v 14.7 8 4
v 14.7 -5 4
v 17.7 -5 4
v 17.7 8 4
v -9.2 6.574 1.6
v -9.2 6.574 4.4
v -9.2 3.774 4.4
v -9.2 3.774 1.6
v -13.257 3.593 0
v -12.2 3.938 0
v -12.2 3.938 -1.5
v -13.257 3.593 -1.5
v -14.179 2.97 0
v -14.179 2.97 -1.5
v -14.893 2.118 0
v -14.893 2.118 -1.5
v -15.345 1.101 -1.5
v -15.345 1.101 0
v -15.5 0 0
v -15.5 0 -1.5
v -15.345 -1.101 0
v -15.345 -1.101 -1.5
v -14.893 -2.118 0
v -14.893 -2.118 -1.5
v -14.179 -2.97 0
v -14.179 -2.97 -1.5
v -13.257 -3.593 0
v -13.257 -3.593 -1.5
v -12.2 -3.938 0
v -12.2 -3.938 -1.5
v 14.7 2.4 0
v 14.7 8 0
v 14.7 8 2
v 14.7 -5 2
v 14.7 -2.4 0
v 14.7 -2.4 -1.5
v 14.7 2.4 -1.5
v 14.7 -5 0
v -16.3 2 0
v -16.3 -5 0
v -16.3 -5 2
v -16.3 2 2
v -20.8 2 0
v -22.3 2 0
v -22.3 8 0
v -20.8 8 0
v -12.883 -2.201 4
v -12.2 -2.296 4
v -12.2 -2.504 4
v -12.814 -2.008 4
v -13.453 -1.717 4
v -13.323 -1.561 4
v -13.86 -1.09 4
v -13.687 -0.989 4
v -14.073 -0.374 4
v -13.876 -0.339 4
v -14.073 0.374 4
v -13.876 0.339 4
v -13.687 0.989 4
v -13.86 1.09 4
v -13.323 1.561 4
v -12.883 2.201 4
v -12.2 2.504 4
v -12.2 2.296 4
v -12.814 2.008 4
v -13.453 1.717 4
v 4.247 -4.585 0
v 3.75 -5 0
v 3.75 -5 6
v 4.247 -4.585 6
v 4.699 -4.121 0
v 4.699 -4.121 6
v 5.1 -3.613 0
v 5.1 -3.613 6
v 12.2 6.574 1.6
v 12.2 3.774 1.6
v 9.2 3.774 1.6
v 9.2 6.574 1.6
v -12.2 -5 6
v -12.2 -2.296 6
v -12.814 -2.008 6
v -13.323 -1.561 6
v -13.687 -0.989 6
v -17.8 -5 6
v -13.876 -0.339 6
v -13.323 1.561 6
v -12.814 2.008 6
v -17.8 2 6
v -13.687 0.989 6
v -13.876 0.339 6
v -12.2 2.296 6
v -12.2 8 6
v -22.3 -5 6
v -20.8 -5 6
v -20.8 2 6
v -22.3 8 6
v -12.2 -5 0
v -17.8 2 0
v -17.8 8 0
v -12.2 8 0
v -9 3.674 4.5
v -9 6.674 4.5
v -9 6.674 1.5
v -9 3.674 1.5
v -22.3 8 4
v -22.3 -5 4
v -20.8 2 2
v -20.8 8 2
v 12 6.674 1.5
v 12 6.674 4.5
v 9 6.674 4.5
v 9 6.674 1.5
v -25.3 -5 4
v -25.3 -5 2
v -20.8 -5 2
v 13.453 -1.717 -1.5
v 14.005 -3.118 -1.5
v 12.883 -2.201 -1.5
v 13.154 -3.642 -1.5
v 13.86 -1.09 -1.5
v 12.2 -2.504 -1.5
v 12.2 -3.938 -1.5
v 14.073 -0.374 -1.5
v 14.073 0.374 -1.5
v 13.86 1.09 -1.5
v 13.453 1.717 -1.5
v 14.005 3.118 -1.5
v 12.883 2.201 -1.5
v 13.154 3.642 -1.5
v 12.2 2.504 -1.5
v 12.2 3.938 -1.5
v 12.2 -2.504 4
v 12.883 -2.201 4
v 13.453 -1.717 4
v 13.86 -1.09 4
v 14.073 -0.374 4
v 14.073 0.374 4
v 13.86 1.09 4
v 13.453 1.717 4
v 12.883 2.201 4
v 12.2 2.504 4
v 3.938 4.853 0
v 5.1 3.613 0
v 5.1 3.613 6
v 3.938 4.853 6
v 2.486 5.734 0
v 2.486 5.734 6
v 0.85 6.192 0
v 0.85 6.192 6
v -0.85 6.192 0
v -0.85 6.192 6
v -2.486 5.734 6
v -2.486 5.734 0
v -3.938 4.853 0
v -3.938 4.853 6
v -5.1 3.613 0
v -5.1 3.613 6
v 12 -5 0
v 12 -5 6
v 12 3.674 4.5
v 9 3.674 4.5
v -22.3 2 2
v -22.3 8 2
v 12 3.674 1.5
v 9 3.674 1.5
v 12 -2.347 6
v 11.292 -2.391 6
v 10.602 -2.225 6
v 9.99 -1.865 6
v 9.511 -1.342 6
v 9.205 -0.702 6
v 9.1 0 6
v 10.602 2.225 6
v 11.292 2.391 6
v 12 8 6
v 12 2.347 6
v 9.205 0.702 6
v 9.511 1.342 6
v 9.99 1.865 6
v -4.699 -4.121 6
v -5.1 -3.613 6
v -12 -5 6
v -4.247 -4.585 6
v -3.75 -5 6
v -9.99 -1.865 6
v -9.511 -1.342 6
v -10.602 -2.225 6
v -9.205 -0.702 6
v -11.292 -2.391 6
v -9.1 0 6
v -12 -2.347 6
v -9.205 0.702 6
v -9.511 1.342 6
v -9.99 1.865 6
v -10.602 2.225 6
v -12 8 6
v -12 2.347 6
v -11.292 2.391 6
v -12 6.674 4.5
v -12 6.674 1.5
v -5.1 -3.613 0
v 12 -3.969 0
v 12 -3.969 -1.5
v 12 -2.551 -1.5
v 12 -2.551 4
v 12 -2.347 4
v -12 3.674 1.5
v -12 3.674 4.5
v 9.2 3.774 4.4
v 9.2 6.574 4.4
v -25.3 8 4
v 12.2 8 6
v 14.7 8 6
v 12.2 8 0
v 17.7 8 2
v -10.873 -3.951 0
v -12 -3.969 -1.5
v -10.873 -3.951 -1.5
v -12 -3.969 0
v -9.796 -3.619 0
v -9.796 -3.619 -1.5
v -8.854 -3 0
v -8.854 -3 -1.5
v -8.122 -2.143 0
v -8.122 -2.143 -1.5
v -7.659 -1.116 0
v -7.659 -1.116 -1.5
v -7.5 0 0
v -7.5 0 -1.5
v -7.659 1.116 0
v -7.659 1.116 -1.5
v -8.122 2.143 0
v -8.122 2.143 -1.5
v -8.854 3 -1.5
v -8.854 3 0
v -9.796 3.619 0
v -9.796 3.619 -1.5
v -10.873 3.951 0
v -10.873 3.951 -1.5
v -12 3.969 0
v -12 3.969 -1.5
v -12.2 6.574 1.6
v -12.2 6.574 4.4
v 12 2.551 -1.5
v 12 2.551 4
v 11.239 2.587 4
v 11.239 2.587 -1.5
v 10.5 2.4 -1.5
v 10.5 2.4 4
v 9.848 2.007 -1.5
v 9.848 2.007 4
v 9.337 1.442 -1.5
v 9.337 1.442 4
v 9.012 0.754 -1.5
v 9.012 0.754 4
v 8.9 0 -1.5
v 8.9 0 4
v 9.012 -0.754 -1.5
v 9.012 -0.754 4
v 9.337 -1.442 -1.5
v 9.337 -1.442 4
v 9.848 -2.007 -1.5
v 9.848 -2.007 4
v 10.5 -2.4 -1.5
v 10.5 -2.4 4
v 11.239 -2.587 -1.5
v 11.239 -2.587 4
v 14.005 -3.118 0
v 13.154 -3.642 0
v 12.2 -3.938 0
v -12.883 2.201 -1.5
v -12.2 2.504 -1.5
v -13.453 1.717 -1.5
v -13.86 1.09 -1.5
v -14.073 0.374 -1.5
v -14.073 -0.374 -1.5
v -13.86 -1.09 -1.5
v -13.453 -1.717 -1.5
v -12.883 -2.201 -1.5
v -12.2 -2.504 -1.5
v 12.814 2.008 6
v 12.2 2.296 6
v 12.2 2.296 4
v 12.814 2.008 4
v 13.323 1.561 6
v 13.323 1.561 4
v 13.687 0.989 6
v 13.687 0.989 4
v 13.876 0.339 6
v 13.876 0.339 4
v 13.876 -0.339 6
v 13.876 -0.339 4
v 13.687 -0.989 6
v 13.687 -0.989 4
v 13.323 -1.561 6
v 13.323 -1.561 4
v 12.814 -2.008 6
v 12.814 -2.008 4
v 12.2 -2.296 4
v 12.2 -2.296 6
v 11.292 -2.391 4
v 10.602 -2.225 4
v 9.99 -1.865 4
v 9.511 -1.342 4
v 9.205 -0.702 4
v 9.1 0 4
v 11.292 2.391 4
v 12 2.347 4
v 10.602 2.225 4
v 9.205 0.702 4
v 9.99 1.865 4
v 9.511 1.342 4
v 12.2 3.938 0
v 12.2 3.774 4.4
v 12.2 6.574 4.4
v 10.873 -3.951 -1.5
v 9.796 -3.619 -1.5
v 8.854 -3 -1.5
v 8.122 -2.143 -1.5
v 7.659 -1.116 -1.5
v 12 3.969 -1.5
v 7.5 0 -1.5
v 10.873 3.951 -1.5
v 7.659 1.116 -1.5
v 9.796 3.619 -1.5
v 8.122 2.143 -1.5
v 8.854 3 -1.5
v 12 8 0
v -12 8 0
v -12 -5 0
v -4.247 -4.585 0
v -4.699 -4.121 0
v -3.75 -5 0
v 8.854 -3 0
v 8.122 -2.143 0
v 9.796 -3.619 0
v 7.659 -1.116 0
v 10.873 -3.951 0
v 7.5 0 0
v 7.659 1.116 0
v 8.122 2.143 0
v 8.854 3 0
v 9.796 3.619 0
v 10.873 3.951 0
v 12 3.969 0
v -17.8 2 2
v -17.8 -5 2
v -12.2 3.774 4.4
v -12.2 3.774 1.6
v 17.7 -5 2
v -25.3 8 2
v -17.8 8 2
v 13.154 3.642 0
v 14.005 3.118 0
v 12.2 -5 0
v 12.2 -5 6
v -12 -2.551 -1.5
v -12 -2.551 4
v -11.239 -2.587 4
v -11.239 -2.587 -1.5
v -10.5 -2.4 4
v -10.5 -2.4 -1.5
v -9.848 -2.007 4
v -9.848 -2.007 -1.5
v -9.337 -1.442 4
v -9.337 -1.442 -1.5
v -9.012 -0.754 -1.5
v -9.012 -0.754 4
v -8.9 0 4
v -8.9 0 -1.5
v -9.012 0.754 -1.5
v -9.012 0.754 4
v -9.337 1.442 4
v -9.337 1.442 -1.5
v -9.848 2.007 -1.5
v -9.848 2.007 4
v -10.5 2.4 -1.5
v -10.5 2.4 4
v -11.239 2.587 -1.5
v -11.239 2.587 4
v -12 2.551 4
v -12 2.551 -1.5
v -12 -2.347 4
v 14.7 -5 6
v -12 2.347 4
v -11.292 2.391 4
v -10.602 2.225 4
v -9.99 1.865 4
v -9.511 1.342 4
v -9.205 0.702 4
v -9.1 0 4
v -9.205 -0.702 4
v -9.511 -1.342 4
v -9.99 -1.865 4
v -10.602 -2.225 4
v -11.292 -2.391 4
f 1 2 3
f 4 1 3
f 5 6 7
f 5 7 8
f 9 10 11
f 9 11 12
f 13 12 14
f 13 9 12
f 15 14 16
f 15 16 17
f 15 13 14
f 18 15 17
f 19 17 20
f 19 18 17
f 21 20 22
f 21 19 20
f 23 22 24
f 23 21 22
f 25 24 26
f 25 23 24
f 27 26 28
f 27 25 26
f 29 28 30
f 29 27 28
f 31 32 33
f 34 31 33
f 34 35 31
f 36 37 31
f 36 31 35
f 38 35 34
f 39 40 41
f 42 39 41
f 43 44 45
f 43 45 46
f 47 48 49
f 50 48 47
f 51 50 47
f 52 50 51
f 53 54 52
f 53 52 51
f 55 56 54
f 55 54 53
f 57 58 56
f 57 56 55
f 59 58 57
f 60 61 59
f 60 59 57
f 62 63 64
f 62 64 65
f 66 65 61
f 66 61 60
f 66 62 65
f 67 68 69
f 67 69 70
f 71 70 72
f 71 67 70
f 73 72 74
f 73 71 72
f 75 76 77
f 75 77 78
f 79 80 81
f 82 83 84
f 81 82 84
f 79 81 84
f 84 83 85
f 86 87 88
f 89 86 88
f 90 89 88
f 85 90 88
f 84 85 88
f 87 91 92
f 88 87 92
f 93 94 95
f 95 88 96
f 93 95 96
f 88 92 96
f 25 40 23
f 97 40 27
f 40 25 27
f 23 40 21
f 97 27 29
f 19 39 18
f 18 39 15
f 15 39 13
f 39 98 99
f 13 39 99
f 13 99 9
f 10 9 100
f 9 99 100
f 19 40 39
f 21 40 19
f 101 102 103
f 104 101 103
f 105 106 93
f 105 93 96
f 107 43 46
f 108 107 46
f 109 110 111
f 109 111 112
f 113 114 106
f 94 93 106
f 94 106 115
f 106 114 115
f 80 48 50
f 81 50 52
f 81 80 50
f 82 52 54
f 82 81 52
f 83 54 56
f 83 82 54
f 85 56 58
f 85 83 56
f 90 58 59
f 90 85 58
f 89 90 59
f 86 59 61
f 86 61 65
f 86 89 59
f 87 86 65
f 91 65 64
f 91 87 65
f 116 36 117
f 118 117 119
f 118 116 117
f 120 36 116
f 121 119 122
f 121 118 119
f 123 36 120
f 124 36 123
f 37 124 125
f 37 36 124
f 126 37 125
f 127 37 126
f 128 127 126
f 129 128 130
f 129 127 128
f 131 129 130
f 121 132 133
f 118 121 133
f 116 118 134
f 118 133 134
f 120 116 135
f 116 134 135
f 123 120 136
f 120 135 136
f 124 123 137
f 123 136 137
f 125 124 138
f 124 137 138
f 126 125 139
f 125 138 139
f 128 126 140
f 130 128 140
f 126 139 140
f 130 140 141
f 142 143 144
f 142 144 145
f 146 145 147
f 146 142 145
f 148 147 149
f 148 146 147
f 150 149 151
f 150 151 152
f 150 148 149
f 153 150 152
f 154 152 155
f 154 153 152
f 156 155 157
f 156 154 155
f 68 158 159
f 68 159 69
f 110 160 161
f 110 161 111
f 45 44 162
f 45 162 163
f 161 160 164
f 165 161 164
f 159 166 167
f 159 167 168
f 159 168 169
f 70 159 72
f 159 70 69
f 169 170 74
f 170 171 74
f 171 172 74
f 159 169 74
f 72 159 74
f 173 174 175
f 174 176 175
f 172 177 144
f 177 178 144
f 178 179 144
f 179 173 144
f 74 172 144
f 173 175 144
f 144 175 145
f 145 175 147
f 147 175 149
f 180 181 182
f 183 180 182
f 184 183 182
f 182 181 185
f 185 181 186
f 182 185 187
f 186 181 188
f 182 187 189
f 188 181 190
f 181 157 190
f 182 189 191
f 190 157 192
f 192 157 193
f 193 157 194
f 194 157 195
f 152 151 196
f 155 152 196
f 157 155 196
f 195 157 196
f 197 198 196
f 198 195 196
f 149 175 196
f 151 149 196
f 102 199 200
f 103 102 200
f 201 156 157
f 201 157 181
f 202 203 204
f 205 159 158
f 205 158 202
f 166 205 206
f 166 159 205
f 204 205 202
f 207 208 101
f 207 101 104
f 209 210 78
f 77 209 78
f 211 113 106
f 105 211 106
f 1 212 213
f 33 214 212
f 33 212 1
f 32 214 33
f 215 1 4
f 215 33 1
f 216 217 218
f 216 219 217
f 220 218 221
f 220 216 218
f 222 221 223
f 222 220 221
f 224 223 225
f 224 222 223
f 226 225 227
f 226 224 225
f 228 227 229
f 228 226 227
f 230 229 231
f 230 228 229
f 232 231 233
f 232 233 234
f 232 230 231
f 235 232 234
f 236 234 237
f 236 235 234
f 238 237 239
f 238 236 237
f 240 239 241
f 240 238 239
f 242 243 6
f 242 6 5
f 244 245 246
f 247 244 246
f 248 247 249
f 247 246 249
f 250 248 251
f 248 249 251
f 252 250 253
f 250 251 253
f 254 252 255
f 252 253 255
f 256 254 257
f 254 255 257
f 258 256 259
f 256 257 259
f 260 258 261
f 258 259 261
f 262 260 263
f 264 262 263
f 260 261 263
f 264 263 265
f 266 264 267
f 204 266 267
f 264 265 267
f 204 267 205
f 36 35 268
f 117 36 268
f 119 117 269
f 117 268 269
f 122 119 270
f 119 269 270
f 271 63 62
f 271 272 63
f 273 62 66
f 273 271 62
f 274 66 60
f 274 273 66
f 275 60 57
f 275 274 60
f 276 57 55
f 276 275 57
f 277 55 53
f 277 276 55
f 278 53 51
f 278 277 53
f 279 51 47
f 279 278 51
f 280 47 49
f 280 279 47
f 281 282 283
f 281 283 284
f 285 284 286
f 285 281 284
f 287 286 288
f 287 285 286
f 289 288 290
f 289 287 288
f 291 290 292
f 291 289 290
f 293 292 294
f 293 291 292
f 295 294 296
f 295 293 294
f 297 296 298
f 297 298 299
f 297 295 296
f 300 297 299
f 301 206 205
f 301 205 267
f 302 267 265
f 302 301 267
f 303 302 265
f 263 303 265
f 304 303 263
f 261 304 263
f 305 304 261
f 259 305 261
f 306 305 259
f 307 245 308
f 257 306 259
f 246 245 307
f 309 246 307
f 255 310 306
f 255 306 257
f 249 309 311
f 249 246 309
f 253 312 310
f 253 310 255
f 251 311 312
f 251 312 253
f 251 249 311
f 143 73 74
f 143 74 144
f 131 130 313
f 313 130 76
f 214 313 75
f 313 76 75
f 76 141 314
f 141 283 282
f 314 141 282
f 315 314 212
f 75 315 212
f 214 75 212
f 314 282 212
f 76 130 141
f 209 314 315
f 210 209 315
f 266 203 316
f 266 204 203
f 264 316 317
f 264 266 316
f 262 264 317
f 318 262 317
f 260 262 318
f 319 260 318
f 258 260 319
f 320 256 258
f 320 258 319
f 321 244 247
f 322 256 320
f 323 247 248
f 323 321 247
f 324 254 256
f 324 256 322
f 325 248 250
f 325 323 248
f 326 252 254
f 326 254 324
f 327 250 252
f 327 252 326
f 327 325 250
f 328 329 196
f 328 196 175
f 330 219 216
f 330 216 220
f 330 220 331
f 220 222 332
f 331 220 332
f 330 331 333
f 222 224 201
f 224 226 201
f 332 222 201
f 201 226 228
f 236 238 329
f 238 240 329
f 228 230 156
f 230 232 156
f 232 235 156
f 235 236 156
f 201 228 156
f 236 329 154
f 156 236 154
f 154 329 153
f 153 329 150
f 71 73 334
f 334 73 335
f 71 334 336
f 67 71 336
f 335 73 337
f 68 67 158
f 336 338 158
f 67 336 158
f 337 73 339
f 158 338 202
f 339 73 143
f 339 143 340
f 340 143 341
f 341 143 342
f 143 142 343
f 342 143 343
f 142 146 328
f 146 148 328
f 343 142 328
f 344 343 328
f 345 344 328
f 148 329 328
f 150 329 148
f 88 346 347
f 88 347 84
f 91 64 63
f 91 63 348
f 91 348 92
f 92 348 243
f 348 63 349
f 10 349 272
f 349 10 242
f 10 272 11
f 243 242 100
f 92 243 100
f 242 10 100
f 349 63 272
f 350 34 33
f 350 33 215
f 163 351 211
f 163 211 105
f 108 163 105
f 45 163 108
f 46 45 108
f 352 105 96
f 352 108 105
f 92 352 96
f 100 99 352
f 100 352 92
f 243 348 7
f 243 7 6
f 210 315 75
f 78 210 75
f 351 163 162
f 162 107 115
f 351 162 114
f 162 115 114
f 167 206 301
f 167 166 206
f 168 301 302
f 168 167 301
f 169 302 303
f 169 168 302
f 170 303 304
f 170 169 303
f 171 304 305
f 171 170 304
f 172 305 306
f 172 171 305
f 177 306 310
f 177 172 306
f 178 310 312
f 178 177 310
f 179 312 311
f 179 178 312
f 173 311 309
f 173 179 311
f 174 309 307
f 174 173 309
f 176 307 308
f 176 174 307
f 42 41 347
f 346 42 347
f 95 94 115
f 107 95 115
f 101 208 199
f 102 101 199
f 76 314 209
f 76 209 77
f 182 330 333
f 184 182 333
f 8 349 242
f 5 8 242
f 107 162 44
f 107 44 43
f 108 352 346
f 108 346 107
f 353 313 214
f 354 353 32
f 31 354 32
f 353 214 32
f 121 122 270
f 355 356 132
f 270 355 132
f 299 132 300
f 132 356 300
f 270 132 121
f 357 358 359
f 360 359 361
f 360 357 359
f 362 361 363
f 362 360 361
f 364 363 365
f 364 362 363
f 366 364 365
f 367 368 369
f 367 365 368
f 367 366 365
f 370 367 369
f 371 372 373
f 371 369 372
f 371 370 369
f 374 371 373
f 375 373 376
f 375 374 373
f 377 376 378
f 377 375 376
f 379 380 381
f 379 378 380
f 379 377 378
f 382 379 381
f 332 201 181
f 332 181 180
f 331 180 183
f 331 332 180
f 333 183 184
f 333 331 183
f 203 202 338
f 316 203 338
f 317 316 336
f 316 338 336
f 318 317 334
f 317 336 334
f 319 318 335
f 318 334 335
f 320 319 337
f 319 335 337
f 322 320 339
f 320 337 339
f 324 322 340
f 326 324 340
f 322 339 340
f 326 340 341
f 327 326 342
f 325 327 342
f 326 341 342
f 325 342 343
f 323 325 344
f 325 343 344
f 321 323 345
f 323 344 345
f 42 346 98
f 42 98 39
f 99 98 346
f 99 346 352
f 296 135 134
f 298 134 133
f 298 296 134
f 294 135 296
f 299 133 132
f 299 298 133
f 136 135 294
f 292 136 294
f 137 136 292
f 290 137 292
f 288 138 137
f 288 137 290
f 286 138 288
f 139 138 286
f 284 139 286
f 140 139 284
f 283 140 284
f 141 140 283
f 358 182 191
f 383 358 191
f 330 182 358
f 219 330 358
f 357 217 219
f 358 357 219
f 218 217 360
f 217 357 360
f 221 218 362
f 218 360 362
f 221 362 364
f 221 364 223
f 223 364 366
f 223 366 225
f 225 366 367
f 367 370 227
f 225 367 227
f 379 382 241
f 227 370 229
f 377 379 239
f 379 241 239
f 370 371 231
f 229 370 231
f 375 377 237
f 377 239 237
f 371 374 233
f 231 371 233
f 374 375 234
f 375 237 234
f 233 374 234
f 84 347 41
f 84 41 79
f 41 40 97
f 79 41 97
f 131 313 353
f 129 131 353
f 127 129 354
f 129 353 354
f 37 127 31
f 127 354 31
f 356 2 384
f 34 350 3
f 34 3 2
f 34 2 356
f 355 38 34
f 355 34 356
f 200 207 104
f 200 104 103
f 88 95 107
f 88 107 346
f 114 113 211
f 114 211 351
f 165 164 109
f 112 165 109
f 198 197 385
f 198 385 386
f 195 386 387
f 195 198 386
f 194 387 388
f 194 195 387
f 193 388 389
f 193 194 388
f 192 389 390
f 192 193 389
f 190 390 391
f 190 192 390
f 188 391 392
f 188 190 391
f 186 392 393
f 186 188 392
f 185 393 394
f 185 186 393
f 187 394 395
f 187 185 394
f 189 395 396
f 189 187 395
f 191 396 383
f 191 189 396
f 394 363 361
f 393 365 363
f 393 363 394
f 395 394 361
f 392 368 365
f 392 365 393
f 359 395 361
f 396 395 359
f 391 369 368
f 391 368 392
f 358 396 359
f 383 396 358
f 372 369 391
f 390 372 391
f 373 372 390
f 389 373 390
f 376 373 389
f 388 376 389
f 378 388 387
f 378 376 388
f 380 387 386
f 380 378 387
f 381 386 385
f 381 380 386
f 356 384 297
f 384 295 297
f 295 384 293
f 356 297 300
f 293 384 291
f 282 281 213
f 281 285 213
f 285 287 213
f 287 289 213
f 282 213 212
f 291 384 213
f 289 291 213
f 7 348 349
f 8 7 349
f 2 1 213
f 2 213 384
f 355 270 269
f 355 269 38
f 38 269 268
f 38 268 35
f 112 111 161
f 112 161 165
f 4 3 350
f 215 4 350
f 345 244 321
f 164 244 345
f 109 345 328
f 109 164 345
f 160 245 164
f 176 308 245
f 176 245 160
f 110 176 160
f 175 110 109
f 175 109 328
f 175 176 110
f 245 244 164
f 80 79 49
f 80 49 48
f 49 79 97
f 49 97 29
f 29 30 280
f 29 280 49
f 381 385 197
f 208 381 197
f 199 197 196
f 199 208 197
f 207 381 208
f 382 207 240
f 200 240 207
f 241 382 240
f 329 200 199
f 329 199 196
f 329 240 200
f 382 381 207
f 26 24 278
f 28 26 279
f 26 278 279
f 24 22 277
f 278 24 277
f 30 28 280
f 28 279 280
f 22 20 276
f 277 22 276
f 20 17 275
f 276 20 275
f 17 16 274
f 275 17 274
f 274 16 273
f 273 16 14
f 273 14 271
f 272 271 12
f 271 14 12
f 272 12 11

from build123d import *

# Parameters (mm, degrees)
SKETCH1_R            = 1
BOSS_EXTRUDE1_DEPTH  = 6
SKETCH2_R            = 2.6
CUT_EXTRUDE1_DEPTH   = 6
SKETCH3_W            = 7.6
SKETCH3_H            = 13
BOSS_EXTRUDE2_DEPTH  = 6
BOSS_EXTRUDE5_START  = -5
SKETCH6_W            = 3
SKETCH6_H            = 2
BOSS_EXTRUDE5_DEPTH  = 13
BOSS_EXTRUDE6_START  = -6
SKETCH10_R           = 4
SKETCH10_R_2         = 2.6
BOSS_EXTRUDE6_DEPTH  = 1.5
BOSS_EXTRUDE7_START  = -6
SKETCH12_R           = 2.6
SKETCH12_R_2         = 2.4
BOSS_EXTRUDE7_DEPTH  = 2
CUT_EXTRUDE2_DEPTH   = 7
SKETCH14_W           = 3
SKETCH14_H           = 6
CUT_EXTRUDE3_DEPTH   = 2
SKETCH15_W           = 0.2
SKETCH15_H           = 13
CUT_EXTRUDE5_DEPTH   = 7.5
SKETCH16_W           = 3
SKETCH16_H           = 3
CUT_EXTRUDE6_DEPTH   = 3
SKETCH17_W           = 2.8
SKETCH17_H           = 2.8
BOSS_EXTRUDE9_DEPTH  = 3
BOSS_EXTRUDE10_START = 24.4
SKETCH17_2_W         = 2.8
SKETCH17_2_H         = 2.8
BOSS_EXTRUDE10_DEPTH = 3


with BuildPart() as part:
    # Sketch1 → Boss-Extrude1 (new body)
    with BuildSketch(Plane.XY):
        with BuildLine():
            ThreePointArc((3.75, -5), (4.47902769, -4.358991965), (5.1, -3.61282438))
            Line((5.1, -3.61282438), (5.1, 3.61282438))
            ThreePointArc((5.1, 3.61282438), (0, 6.25), (-5.1, 3.61282438))
            Line((-5.1, 3.61282438), (-5.1, -3.61282438))
            ThreePointArc((-5.1, -3.61282438), (-4.47902769, -4.358991965), (-3.75, -5))
            Line((-3.75, -5), (-14.7, -5))
            Line((-14.7, -5), (-14.7, 8))
            Line((-14.7, 8), (14.7, 8))
            Line((14.7, 8), (14.7, -5))
            Line((14.7, -5), (3.75, -5))
        make_face()
        with Locations((11.5, 0)):
            Circle(SKETCH1_R, mode=Mode.SUBTRACT)
        with Locations((-11.5, 0)):
            Circle(SKETCH1_R, mode=Mode.SUBTRACT)
    extrude(amount=BOSS_EXTRUDE1_DEPTH)

    # Sketch2 → Cut-Extrude1 (cut)
    with BuildSketch(Plane.XY):
        with Locations((-11.5, 0)):
            Circle(SKETCH2_R)
        with Locations((11.5, 0)):
            Circle(SKETCH2_R)
    extrude(amount=CUT_EXTRUDE1_DEPTH, mode=Mode.SUBTRACT)

    # Sketch3 → Boss-Extrude2 (add)
    with BuildSketch(Plane.XY):
        with Locations((-18.5, 1.5)):
            Rectangle(SKETCH3_W, SKETCH3_H)
    extrude(amount=BOSS_EXTRUDE2_DEPTH)

    # Sketch6 → Boss-Extrude5 (add)
    with BuildSketch(Plane(origin=(0, 0, 0), x_dir=(1, 0, 0), z_dir=(0, 1, 0)).offset(BOSS_EXTRUDE5_START)):
        with Locations((-23.8, -3)):
            Rectangle(SKETCH6_W, SKETCH6_H)
        with Locations((16.2, -3)):
            Rectangle(SKETCH6_W, SKETCH6_H)
    extrude(amount=BOSS_EXTRUDE5_DEPTH)

    # Sketch10 → Boss-Extrude6 (add)
    with BuildSketch(Plane.XY.offset(6).offset(BOSS_EXTRUDE6_START)):
        with Locations((-11.5, 0)):
            Circle(SKETCH10_R)
        with Locations((-11.5, 0)):
            Circle(SKETCH10_R_2, mode=Mode.SUBTRACT)
        with BuildLine():
            Line((14.7, 2.4), (14.7, -2.4))
            ThreePointArc((14.7, -2.4), (7.5, 0), (14.7, 2.4))
        make_face()
        with Locations((11.5, 0)):
            Circle(SKETCH10_R_2, mode=Mode.SUBTRACT)
    extrude(amount=-BOSS_EXTRUDE6_DEPTH)

    # Sketch12 → Boss-Extrude7 (add)
    with BuildSketch(Plane(origin=(0, 0, 0), x_dir=(-1, 0, 0), z_dir=(0, 0, -1)).offset(BOSS_EXTRUDE7_START)):
        with Locations((11.5, 0)):
            Circle(SKETCH12_R)
        with Locations((11.5, 0)):
            Circle(SKETCH12_R_2, mode=Mode.SUBTRACT)
        with Locations((-11.5, 0)):
            Circle(SKETCH12_R)
        with Locations((-11.5, 0)):
            Circle(SKETCH12_R_2, mode=Mode.SUBTRACT)
    extrude(amount=BOSS_EXTRUDE7_DEPTH)

    # Sketch13 → Cut-Extrude2 (cut)
    with BuildSketch(Plane.XZ.offset(5)):
        Polygon((-22.3, 0), (-16.3, 0), (-16.3, 2), (-17.8, 2), (-17.8, 6), (-20.8, 6), (-20.8, 2), (-22.3, 2), align=None)
    extrude(amount=-CUT_EXTRUDE2_DEPTH, mode=Mode.SUBTRACT)

    # Sketch14 → Cut-Extrude3 (cut)
    with BuildSketch(Plane(origin=(0, 0, 0), x_dir=(-1, 0, 0), z_dir=(0, 0, -1))):
        with Locations((19.3, 5)):
            Rectangle(SKETCH14_W, SKETCH14_H)
    extrude(amount=-CUT_EXTRUDE3_DEPTH, mode=Mode.SUBTRACT)

    # Sketch15 → Cut-Extrude5 (cut, symmetric)
    with BuildSketch(Plane.XY):
        with Locations((-12.1, 1.5)):
            Rectangle(SKETCH15_W, SKETCH15_H)
        with Locations((12.1, 1.5)):
            Rectangle(SKETCH15_W, SKETCH15_H)
    extrude(amount=CUT_EXTRUDE5_DEPTH, both=True, mode=Mode.SUBTRACT)

    # Sketch16 → Cut-Extrude6 (cut)
    with BuildSketch(Plane(origin=(12, 0, 0), x_dir=(0, 0, -1), z_dir=(1, 0, 0))):
        with Locations((-3, 5.173669459)):
            Rectangle(SKETCH16_W, SKETCH16_H)
    cut_extrude6 = extrude(amount=-CUT_EXTRUDE6_DEPTH, mode=Mode.SUBTRACT)

    # Mirror1: Cut-Extrude6 across plane
    add(cut_extrude6.mirror(Plane(origin=(0, 0, 0), x_dir=(0, 0, 1), z_dir=(1, 0, 0))), mode=Mode.SUBTRACT)

    # Sketch17 → Boss-Extrude9 (add)
    with BuildSketch(Plane(origin=(-12.2, 0, 0), x_dir=(0, 0, -1), z_dir=(1, 0, 0))):
        with Locations((-3, 5.173669459)):
            Rectangle(SKETCH17_W, SKETCH17_H)
    extrude(amount=BOSS_EXTRUDE9_DEPTH)

    # Sketch17<2> → Boss-Extrude10 (add)
    with BuildSketch(Plane(origin=(-12.2, 0, 0), x_dir=(0, 0, -1), z_dir=(1, 0, 0)).offset(BOSS_EXTRUDE10_START)):
        with Locations((-3, 5.173669459)):
            Rectangle(SKETCH17_2_W, SKETCH17_2_H)
    extrude(amount=-BOSS_EXTRUDE10_DEPTH)


solid = part.part
